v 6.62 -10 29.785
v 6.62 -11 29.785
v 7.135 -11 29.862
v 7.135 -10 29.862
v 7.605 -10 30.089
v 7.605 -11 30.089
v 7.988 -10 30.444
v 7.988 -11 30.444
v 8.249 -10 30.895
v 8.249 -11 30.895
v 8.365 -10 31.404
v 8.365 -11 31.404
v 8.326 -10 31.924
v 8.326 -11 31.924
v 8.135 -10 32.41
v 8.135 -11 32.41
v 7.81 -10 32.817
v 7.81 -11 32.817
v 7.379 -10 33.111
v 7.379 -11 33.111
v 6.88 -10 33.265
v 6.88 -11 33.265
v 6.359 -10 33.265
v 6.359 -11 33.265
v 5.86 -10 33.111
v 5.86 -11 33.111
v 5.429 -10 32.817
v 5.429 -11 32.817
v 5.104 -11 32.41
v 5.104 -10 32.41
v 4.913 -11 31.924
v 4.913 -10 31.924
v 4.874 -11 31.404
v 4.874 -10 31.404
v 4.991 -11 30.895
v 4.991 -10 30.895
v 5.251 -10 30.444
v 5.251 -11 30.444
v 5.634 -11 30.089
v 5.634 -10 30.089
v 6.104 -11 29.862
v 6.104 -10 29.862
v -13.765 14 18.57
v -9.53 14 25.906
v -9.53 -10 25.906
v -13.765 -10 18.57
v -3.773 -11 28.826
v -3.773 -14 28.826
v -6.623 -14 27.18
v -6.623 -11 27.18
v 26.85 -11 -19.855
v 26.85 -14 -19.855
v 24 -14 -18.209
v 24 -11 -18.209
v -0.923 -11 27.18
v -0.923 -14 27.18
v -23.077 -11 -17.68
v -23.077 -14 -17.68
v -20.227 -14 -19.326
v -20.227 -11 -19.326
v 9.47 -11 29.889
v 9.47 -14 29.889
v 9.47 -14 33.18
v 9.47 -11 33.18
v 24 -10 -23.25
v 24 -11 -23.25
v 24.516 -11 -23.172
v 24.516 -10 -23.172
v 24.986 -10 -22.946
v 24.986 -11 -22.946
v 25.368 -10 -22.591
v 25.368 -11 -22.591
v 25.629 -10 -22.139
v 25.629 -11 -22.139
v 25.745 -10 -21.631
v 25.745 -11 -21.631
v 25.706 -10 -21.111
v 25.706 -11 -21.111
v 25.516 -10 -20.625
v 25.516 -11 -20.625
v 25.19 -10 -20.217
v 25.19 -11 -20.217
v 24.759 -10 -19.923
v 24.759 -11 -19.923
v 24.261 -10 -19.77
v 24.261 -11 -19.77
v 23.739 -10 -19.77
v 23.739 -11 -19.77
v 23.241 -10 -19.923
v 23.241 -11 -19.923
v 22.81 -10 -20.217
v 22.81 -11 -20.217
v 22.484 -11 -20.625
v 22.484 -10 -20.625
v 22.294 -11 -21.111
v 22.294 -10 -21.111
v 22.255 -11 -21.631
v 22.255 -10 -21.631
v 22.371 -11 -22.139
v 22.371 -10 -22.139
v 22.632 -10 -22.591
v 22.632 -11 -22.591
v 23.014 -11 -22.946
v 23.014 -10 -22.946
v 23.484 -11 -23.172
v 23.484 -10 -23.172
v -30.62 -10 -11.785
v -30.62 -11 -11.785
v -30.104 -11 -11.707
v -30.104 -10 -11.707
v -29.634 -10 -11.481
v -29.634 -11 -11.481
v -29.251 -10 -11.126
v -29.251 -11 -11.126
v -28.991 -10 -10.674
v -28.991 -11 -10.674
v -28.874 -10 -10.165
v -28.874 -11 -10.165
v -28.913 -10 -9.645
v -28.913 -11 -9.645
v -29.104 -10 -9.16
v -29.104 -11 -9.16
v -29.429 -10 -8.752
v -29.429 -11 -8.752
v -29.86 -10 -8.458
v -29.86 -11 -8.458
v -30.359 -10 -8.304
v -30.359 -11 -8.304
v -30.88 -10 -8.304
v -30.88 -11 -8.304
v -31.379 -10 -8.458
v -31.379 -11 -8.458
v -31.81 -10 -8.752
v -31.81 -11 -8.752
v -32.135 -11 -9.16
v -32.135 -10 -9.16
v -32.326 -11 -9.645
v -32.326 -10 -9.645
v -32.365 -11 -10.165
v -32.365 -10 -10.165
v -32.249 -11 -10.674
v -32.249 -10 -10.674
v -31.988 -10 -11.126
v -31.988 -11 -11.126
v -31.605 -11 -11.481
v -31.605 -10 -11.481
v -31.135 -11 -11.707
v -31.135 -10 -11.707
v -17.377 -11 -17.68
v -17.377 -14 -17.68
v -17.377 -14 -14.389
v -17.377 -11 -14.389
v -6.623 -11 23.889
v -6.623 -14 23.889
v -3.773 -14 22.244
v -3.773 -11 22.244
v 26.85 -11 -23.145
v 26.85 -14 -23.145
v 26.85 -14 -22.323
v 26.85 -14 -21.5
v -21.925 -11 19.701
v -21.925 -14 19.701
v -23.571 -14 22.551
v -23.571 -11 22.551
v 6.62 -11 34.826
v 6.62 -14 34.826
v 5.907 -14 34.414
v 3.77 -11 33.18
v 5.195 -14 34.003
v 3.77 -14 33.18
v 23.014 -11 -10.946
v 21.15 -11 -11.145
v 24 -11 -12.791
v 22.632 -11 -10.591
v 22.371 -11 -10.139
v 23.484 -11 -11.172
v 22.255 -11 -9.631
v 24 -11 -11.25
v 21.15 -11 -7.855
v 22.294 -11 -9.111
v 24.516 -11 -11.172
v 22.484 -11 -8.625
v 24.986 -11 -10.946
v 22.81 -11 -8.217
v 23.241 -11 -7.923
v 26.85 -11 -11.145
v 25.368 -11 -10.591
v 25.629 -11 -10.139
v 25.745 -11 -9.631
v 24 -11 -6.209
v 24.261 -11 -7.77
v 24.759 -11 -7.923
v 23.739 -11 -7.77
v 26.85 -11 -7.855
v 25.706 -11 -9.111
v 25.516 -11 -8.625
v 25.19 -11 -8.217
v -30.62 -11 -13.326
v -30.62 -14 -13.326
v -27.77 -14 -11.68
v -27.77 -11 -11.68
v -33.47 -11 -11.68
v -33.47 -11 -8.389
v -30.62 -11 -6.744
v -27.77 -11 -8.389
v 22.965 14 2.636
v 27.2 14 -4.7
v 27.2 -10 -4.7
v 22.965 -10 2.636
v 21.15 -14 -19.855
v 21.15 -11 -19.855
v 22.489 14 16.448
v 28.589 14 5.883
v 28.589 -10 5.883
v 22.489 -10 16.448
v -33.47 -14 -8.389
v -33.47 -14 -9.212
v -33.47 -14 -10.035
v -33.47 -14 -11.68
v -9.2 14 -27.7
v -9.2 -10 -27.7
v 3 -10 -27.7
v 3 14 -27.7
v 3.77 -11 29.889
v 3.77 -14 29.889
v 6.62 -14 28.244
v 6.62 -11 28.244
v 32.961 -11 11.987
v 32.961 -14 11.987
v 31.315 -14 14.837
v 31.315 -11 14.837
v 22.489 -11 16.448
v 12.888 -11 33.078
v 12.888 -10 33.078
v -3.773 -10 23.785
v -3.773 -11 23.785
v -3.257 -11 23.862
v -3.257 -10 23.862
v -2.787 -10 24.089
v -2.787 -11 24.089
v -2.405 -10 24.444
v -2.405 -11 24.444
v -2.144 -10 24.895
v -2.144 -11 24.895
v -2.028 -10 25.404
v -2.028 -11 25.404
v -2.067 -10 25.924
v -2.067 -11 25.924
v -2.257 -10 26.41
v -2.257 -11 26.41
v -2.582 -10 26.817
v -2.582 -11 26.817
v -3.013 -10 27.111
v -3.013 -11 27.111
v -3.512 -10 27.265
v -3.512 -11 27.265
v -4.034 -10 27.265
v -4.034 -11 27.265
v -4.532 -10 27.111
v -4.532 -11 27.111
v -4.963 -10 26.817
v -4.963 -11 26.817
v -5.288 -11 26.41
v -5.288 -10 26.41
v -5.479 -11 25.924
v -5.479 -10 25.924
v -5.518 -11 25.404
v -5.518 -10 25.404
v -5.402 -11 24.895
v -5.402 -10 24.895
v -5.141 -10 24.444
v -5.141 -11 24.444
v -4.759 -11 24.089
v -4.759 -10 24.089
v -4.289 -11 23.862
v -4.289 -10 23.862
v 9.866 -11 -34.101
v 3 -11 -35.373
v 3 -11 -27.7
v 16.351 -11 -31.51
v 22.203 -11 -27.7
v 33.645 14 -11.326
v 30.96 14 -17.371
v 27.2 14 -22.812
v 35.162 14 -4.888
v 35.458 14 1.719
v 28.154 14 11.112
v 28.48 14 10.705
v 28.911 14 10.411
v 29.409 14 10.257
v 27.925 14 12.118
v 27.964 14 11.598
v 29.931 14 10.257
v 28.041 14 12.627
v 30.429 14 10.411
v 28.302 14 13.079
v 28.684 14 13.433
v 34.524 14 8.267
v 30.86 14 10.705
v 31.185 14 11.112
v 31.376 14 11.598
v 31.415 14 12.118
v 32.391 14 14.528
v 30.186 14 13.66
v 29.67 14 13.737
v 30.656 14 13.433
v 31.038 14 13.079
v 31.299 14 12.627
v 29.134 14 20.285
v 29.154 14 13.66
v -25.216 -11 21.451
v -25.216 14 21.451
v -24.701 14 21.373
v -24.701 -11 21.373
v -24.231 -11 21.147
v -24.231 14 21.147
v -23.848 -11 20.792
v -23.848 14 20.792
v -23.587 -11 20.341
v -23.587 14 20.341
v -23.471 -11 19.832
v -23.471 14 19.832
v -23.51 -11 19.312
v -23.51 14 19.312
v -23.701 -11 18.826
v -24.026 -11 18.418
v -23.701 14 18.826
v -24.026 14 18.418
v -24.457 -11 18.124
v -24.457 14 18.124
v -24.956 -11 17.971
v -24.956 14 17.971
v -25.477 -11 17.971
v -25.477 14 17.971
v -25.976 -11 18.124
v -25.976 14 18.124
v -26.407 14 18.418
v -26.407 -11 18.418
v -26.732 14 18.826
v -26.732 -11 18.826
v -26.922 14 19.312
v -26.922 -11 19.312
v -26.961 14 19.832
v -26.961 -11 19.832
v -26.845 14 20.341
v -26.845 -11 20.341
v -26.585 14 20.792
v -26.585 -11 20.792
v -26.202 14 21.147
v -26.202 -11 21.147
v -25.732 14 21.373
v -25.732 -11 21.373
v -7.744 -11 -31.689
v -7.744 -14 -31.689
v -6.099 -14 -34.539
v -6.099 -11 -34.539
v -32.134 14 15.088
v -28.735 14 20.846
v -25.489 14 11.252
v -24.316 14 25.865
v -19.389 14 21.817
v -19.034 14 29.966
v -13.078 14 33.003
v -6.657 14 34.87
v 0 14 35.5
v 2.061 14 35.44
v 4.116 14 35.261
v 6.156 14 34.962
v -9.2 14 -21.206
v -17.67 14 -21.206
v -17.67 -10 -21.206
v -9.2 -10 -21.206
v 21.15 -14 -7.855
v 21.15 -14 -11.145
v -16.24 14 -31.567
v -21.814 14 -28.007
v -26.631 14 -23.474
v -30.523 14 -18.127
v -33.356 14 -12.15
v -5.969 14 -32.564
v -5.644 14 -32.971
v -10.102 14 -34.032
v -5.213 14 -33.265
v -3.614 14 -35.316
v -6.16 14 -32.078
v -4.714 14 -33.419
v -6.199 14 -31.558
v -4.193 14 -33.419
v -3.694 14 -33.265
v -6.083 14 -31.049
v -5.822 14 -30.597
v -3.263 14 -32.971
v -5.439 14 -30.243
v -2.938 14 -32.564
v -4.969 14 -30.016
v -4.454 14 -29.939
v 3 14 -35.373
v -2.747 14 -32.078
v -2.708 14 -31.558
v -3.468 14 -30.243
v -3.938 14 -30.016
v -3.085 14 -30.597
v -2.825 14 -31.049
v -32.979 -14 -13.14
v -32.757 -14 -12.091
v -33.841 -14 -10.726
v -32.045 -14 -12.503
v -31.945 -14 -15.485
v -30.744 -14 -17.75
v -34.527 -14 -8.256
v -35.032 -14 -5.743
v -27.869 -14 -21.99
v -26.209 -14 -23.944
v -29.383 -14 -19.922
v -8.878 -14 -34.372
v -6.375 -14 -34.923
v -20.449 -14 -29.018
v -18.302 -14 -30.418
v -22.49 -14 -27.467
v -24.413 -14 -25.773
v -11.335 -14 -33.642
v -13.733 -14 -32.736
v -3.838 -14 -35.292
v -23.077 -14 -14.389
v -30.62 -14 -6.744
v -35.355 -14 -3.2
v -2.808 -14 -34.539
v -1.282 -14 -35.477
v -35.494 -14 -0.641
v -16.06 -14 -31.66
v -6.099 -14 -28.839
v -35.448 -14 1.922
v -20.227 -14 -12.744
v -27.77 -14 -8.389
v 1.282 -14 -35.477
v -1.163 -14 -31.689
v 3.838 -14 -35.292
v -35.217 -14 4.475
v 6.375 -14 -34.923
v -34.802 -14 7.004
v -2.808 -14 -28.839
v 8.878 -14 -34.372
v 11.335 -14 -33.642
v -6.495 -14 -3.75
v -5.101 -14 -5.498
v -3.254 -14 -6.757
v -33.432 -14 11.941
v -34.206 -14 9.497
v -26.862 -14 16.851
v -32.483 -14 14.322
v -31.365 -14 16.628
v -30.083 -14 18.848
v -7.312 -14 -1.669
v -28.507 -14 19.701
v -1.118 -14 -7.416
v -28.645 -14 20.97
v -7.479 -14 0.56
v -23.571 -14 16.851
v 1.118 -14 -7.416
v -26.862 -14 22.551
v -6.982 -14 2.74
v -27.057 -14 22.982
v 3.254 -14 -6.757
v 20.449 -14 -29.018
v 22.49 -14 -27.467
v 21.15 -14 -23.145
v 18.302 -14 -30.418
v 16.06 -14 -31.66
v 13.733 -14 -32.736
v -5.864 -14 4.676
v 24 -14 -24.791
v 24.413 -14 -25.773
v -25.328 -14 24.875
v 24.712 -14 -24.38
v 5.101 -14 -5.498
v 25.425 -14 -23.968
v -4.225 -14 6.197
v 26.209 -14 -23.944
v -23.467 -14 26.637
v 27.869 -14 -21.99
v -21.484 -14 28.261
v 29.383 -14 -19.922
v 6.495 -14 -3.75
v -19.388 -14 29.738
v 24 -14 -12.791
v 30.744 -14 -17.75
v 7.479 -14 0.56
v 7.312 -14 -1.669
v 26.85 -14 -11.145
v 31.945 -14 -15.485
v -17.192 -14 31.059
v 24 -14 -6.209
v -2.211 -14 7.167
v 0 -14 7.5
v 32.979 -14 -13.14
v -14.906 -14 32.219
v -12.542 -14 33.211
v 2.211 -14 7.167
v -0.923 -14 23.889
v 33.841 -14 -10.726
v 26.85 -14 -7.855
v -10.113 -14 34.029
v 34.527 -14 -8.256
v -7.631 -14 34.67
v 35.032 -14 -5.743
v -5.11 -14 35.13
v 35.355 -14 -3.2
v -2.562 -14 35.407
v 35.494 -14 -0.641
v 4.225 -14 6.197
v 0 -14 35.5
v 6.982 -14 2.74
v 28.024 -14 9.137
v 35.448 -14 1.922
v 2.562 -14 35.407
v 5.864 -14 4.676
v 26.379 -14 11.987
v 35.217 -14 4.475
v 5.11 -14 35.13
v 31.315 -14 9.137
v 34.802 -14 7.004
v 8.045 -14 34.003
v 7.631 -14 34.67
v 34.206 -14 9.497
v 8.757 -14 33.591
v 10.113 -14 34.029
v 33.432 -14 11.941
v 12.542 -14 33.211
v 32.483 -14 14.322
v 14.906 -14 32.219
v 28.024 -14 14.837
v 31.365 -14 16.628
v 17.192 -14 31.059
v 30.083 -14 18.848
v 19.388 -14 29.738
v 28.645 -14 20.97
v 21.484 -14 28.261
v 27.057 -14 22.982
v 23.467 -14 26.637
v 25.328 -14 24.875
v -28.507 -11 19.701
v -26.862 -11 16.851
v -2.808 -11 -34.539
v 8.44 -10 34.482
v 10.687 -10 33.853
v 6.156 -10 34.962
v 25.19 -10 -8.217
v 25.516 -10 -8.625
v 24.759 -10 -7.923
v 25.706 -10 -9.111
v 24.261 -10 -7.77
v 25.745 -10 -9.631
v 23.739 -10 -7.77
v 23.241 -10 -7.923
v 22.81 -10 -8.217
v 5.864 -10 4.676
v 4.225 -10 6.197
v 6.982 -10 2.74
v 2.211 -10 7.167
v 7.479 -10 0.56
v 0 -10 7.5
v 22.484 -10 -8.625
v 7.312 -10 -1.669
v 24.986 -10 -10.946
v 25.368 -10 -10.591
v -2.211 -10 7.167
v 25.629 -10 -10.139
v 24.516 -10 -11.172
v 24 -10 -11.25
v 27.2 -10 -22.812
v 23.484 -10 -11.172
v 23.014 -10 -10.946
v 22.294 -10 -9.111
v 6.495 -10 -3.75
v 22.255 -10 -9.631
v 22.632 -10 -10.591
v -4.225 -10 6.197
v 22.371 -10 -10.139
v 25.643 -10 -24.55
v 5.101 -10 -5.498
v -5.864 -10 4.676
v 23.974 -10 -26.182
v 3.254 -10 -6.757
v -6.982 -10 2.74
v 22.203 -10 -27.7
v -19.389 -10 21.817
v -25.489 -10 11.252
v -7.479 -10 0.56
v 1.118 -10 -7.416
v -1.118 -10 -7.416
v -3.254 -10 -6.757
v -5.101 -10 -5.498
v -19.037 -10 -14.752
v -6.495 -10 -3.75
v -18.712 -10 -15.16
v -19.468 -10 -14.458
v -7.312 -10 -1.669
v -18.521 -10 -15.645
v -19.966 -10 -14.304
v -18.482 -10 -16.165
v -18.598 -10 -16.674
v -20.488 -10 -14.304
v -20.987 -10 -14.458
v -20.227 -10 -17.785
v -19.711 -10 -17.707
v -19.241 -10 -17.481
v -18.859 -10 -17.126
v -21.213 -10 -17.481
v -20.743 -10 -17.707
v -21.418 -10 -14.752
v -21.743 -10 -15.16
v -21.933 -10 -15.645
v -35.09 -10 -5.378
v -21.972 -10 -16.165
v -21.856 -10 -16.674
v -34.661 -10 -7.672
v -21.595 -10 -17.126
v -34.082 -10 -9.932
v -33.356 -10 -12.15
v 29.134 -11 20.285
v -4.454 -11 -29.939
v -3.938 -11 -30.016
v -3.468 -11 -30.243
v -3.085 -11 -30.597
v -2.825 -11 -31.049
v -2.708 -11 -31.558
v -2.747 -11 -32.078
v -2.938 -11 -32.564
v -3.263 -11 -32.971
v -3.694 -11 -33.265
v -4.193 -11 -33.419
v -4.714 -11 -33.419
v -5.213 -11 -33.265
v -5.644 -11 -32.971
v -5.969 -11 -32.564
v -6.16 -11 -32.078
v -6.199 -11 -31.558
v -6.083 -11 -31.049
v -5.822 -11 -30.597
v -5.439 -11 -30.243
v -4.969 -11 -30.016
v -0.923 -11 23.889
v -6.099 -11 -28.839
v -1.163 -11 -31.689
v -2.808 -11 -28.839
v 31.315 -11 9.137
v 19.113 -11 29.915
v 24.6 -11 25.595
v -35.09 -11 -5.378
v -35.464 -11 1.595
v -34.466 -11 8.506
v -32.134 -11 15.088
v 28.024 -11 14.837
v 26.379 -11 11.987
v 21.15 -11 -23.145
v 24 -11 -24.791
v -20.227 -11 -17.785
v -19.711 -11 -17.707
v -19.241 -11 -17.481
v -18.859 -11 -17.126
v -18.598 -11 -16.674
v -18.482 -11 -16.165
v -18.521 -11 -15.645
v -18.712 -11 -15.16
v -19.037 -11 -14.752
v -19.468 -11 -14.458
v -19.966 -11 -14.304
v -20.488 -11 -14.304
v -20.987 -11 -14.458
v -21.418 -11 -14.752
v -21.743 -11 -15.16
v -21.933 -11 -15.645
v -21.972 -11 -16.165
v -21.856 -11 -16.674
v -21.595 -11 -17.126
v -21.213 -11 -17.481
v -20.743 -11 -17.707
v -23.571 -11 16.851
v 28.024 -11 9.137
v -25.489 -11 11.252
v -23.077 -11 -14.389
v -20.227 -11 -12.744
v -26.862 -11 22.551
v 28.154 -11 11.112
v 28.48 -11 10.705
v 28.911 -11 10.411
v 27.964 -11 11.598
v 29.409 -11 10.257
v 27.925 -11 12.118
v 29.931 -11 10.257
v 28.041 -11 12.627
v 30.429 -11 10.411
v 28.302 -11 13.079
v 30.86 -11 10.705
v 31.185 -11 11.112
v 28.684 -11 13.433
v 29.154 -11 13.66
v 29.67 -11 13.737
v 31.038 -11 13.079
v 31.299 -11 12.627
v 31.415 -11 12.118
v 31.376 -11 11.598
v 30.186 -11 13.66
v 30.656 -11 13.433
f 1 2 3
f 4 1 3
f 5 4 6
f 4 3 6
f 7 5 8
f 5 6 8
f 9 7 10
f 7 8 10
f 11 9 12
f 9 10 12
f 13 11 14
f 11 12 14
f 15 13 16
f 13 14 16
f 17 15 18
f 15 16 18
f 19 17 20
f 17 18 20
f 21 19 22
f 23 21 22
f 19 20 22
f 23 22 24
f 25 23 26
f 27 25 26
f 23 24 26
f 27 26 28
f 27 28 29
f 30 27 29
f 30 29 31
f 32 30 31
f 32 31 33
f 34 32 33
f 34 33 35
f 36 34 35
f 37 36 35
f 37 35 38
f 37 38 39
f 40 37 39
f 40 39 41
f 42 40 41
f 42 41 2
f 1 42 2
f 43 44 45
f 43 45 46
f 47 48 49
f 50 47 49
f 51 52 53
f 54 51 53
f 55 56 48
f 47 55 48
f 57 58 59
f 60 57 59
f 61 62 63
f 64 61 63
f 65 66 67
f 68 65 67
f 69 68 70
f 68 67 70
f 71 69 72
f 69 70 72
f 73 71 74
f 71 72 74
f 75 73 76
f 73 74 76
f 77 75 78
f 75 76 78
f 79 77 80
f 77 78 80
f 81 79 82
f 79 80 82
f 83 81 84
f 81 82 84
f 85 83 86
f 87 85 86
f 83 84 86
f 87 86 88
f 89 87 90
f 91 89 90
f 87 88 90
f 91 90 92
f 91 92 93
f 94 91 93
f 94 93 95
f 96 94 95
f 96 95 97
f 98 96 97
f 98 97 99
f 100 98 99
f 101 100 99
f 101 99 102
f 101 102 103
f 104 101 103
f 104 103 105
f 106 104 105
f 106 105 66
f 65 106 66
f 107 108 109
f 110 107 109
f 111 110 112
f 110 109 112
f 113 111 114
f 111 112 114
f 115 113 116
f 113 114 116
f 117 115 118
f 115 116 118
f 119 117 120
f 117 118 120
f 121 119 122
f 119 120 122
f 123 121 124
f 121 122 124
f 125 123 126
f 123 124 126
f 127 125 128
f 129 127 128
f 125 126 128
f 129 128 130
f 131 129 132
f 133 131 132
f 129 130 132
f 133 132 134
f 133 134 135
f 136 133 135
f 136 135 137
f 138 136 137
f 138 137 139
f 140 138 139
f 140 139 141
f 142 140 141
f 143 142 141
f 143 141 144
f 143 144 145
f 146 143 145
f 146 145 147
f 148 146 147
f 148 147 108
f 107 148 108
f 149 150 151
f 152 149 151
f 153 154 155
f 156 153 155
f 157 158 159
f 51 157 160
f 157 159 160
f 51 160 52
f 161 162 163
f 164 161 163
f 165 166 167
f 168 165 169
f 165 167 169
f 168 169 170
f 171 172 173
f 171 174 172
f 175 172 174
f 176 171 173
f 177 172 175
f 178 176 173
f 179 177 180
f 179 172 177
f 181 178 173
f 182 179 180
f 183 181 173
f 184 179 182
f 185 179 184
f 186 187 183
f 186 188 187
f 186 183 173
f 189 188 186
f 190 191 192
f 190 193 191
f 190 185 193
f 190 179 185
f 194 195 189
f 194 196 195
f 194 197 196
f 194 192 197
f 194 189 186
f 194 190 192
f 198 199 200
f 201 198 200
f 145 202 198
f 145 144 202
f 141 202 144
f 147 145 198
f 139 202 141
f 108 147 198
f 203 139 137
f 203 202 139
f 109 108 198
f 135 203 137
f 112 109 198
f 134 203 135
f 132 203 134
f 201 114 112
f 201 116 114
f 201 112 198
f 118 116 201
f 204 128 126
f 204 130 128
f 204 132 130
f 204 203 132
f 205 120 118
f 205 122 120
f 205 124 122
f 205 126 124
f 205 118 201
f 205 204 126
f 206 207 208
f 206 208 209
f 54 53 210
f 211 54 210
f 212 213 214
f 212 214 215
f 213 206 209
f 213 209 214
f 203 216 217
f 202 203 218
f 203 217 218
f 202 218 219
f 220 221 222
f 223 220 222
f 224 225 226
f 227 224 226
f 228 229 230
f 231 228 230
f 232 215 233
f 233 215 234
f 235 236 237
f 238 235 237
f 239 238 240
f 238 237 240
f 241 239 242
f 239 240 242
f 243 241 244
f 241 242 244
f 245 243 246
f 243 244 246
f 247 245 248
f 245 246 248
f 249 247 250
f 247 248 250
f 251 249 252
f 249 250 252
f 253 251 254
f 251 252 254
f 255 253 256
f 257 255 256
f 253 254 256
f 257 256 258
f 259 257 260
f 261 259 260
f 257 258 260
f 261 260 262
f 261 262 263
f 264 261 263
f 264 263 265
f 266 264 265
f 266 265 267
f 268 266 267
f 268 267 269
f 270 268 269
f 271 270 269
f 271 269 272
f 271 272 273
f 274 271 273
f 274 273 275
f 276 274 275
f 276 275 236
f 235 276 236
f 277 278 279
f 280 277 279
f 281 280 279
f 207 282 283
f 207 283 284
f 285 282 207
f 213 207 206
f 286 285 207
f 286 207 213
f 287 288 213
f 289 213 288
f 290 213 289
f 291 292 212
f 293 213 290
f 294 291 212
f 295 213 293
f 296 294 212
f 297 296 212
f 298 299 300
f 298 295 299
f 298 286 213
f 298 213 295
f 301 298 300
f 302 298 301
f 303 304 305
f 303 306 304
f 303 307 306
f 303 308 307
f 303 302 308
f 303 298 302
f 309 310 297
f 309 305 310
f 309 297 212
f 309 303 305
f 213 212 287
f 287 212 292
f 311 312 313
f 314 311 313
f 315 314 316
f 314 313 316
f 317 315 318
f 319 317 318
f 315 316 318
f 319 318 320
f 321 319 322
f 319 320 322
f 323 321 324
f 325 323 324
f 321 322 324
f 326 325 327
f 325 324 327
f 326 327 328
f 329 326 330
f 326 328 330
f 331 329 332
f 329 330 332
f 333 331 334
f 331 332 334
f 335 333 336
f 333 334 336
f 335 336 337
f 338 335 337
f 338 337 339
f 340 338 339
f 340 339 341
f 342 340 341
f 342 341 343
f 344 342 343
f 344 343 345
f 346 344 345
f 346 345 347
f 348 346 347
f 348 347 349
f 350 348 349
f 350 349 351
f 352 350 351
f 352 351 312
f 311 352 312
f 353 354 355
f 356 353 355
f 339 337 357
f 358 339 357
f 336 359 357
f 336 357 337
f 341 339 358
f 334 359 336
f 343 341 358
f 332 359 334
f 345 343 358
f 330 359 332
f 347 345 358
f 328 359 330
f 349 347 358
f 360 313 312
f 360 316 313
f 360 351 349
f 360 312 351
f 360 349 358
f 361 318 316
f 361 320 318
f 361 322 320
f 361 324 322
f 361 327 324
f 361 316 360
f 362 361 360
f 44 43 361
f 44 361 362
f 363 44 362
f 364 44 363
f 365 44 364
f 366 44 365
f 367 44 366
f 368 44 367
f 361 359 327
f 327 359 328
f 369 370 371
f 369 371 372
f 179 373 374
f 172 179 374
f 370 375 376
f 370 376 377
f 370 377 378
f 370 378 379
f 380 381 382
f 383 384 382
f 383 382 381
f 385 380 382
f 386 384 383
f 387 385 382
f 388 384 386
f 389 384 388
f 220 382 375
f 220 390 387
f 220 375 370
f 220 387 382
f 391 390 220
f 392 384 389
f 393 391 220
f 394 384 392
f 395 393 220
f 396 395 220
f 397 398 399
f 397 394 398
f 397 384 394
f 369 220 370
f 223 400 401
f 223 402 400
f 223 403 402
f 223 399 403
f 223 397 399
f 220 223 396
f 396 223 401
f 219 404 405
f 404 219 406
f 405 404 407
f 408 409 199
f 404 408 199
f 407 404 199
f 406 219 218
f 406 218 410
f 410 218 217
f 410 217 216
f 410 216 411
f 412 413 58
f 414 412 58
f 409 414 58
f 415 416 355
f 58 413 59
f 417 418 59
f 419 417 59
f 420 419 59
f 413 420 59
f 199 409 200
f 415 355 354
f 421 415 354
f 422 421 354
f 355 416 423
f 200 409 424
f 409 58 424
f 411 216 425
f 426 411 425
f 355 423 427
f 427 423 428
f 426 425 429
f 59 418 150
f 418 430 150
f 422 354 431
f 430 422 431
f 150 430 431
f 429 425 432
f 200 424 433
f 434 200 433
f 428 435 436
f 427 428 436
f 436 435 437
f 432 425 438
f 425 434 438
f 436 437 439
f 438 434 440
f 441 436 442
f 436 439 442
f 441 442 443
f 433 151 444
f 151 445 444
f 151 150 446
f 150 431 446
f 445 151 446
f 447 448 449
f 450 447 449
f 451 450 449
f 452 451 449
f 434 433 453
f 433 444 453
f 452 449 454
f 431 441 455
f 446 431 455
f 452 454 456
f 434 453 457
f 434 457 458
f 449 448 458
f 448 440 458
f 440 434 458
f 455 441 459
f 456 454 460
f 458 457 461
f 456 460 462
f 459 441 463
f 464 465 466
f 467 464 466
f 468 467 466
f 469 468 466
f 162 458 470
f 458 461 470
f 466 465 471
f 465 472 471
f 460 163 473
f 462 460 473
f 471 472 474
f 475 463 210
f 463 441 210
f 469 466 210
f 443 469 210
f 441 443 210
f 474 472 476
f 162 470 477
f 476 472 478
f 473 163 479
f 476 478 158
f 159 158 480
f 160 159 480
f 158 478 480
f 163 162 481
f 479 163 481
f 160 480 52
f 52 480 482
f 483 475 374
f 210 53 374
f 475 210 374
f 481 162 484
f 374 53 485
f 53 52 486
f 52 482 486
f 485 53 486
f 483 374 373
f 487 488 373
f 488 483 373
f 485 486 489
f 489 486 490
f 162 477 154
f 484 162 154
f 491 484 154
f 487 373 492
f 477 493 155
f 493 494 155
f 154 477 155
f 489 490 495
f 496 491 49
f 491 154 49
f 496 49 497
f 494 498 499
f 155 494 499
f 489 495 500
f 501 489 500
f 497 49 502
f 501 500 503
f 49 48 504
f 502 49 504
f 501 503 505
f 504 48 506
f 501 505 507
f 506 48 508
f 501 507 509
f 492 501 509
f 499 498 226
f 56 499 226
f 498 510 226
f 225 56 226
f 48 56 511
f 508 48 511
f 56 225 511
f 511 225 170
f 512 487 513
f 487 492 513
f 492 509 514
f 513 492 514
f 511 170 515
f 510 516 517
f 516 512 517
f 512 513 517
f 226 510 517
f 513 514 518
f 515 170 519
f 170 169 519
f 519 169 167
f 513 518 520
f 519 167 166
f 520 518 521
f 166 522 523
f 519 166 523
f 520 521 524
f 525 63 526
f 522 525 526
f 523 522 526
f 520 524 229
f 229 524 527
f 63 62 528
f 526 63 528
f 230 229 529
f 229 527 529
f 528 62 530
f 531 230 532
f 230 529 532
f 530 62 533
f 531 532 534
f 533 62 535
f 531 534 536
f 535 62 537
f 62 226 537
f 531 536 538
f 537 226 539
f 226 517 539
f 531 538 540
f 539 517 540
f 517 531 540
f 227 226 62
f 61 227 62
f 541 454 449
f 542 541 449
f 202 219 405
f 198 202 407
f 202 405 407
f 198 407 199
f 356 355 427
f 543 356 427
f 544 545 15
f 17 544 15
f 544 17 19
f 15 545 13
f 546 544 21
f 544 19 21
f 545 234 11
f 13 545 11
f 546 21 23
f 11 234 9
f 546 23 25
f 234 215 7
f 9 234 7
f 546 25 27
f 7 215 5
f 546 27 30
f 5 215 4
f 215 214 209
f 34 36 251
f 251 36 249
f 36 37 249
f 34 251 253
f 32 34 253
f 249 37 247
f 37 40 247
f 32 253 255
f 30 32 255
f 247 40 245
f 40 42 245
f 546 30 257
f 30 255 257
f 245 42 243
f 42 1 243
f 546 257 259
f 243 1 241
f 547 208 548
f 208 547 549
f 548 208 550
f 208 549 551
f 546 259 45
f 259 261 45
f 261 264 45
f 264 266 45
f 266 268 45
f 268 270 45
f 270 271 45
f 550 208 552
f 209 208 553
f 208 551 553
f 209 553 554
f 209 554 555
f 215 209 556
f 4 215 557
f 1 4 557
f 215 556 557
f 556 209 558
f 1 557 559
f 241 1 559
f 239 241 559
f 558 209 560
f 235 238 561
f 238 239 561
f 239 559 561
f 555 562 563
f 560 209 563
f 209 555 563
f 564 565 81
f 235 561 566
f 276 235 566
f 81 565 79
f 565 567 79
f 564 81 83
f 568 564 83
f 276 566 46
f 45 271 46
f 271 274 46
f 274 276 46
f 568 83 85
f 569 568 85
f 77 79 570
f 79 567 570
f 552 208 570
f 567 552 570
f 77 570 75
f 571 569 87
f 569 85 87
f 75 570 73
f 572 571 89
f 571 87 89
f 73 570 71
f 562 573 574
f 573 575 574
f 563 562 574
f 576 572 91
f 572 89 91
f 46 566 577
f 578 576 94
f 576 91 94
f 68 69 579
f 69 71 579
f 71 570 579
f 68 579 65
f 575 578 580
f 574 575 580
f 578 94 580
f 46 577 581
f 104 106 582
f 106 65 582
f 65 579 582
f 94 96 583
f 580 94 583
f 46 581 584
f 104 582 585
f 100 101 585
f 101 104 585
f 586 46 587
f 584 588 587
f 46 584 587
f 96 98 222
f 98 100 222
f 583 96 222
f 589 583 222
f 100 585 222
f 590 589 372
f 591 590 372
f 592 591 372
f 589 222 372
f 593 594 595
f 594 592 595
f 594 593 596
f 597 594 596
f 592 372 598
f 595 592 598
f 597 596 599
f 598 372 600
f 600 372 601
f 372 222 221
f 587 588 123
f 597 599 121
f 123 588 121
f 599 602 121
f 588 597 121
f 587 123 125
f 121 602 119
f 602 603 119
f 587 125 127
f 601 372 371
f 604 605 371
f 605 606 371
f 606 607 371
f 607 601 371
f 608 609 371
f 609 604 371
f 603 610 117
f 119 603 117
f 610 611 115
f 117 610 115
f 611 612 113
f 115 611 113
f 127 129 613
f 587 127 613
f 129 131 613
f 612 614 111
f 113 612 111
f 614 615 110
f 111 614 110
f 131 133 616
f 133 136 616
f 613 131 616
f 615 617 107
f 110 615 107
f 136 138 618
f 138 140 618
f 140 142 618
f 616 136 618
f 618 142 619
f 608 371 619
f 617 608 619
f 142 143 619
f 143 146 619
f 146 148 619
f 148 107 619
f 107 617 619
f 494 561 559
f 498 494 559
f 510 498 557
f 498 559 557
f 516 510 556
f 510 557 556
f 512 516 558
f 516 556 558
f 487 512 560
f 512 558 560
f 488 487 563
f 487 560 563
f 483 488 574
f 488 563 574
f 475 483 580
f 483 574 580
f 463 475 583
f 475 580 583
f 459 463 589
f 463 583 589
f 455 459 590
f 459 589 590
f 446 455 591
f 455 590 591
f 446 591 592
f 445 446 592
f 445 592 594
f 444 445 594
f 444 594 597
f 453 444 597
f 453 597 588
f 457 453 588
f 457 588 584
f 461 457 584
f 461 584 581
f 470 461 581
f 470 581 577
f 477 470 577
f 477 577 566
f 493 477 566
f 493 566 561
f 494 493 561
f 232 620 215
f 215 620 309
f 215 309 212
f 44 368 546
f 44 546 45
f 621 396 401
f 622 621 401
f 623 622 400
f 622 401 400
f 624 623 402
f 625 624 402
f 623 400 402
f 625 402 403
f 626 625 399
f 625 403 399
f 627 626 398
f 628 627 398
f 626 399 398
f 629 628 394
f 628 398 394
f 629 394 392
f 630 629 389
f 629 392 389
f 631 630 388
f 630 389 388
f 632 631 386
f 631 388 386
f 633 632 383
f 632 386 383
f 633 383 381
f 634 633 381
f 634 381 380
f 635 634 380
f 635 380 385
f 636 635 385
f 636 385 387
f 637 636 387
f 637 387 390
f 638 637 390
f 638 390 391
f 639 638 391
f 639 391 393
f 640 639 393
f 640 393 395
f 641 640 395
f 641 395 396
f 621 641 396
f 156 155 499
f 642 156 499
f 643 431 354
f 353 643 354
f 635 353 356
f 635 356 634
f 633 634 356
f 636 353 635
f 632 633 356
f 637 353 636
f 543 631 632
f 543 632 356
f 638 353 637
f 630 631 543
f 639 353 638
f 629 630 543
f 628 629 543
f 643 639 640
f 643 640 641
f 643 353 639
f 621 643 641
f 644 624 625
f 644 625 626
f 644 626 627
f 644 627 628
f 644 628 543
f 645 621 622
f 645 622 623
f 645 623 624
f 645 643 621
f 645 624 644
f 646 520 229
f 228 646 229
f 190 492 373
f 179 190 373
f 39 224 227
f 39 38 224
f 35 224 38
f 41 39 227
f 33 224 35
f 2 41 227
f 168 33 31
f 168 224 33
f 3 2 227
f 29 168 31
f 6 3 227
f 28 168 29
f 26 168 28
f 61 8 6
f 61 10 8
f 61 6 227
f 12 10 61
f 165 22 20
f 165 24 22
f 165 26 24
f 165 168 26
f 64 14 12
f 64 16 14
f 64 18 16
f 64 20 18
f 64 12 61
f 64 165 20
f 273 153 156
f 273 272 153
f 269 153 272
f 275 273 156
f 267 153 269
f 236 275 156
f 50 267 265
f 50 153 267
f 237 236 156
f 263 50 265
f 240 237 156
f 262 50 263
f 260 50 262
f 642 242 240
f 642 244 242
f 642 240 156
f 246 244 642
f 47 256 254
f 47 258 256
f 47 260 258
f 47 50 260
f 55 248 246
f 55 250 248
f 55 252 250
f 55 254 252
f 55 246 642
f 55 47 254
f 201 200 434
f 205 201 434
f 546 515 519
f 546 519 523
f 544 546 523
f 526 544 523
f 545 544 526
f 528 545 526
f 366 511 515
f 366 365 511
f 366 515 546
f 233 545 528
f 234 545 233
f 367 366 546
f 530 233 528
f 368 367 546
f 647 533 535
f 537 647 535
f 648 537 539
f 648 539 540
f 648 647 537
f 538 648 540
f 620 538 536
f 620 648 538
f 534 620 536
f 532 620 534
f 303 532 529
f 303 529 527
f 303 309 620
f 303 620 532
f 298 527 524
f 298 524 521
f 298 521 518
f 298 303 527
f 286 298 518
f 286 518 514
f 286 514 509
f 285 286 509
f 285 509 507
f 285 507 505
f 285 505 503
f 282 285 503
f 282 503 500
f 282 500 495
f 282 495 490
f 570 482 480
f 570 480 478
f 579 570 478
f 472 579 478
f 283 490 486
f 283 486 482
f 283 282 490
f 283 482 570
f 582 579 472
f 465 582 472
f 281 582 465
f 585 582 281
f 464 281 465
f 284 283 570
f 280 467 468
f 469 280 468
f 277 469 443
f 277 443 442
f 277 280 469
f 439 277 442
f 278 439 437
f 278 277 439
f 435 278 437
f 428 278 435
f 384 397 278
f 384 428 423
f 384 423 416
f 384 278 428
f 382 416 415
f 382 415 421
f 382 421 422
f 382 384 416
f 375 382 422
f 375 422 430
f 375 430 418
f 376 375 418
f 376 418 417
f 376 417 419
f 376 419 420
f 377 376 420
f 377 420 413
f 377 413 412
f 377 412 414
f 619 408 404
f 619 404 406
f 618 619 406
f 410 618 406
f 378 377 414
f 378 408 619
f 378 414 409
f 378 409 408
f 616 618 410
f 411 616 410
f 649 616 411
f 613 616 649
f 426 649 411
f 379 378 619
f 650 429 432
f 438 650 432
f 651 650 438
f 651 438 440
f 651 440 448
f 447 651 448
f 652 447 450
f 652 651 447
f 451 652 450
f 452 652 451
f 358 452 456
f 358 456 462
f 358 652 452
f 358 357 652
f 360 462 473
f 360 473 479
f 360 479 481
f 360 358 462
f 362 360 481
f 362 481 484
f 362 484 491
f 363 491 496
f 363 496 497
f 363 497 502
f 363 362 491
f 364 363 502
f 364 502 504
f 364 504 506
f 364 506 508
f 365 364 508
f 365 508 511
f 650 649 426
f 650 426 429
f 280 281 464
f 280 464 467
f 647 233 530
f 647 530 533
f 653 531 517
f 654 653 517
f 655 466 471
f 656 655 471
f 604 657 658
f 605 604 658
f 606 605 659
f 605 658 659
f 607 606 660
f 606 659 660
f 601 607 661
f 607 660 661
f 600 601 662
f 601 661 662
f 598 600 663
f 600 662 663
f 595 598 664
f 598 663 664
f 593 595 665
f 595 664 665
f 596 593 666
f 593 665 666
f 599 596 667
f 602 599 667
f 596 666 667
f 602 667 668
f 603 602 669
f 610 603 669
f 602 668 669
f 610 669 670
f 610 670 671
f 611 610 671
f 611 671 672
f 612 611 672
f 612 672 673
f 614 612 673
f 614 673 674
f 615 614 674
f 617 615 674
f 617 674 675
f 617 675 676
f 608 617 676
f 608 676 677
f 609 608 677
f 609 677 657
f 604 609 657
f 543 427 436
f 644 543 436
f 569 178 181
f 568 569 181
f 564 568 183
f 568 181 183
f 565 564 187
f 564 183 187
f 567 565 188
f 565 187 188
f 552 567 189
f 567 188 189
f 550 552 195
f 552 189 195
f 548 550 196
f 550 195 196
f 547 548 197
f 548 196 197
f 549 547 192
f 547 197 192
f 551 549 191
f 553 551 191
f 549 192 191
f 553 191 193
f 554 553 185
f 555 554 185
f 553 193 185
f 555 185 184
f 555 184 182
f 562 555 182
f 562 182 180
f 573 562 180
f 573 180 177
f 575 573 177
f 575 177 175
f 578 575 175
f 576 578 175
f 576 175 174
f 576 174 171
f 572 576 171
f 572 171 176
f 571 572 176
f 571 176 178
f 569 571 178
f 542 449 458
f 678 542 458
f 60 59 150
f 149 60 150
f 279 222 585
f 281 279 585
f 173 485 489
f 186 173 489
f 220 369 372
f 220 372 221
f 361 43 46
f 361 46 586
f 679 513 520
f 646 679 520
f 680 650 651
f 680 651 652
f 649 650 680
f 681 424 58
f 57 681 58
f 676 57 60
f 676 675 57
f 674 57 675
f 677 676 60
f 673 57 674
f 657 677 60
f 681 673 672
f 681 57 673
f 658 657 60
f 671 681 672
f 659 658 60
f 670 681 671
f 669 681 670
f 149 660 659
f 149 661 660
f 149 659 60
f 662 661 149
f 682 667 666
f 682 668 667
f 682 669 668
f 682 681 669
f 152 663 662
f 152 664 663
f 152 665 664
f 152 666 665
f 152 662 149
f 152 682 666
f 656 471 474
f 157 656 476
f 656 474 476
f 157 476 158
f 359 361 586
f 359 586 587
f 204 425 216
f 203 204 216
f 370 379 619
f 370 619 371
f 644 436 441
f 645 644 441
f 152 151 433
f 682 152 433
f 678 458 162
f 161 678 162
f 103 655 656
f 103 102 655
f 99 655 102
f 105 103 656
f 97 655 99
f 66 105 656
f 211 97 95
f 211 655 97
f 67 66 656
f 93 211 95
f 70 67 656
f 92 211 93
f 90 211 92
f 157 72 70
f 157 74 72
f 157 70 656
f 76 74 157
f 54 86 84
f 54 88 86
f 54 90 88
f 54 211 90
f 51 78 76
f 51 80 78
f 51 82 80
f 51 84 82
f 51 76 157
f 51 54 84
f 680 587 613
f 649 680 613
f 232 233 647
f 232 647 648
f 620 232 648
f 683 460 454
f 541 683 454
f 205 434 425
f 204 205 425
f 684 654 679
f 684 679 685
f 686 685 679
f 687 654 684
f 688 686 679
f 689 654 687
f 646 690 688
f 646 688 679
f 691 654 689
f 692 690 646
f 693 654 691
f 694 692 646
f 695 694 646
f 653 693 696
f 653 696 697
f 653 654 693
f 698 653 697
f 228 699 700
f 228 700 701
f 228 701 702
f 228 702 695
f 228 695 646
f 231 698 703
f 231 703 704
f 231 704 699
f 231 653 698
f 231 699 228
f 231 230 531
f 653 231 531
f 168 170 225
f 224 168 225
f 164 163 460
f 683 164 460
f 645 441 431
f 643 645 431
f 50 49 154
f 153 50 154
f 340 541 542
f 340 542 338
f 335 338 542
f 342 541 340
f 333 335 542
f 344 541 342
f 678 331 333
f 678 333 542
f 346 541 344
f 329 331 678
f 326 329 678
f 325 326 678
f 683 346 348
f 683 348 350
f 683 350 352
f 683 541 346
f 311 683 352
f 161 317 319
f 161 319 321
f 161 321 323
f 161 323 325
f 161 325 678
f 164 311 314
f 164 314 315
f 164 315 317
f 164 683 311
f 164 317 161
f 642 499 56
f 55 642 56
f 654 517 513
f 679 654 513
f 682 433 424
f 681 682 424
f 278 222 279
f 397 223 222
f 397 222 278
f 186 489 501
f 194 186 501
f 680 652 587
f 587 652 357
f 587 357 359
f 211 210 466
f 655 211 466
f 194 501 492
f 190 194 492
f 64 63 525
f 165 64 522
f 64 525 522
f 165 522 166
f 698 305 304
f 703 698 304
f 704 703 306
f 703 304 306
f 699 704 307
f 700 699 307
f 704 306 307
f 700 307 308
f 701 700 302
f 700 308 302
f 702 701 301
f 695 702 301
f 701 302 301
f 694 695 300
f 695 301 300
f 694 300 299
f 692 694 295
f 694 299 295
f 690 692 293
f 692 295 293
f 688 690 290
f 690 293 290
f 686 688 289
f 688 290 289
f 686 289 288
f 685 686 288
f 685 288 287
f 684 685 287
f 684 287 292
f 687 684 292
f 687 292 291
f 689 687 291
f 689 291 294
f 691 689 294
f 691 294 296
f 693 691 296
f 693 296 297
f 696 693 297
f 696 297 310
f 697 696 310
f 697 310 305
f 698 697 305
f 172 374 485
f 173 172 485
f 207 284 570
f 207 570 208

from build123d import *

# Parameters (mm, degrees)
SKETCH1_R           = 35.5
BOSS_EXTRUDE1_DEPTH = 14
CUT_EXTRUDE1_DEPTH  = 24
SKETCH3_W           = 20
SKETCH3_H           = 10
CUT_EXTRUDE2_DEPTH  = 25
SKETCH4_R           = 1.75
CUT_EXTRUDE3_DEPTH  = 58.484780595
CUT_EXTRUDE4_DEPTH  = 3
SKETCH6_R           = 1.75
CUT_EXTRUDE5_DEPTH  = 58.484780595
CUT_EXTRUDE6_DEPTH  = 3
SKETCH8_R           = 7.5
CUT_EXTRUDE7_DEPTH  = 56.646203824


with BuildPart() as part:
    # Sketch1 → Boss-Extrude1 (new, symmetric)
    with BuildSketch(Plane(origin=(0, 0, 0), x_dir=(1, 0, 0), z_dir=(0, 1, 0))):
        with Locations(Location((0, 0, 0), (0, 0, 270))):
            Circle(SKETCH1_R)
    extrude(amount=BOSS_EXTRUDE1_DEPTH, both=True)

    # Sketch2 → Cut-Extrude1 (cut)
    with BuildSketch(Plane(origin=(0, 14, 0), x_dir=(1, 0, 0), z_dir=(0, 1, 0))):
        Polygon((27.2, 27.7), (27.2, 4.7), (22.964840301, -2.635511777), (28.588903685, -5.882566285), (10.388903685, -37.405890983), (-9.529680602, -25.905890983), (-13.764840301, -18.570379206), (-19.388903685, -21.817433715), (-37.588903685, 9.705890983), (-17.670319398, 21.205890983), (-9.2, 21.205890983), (-9.2, 27.7), align=None)
    extrude(amount=-CUT_EXTRUDE1_DEPTH, mode=Mode.SUBTRACT)

    # Sketch3 → Cut-Extrude2 (cut)
    with BuildSketch(Plane(origin=(0, 14, 0), x_dir=(1, 0, 0), z_dir=(0, 1, 0))):
        Polygon((-35.488903685, 6.068584287), (-44.149157723, 1.068584287), (-34.149157723, -16.251923789), (-25.488903685, -11.251923789), align=None)
        with Locations((13, 32.7)):
            Rectangle(SKETCH3_W, SKETCH3_H)
        Polygon((12.488903685, -33.768584287), (21.149157723, -38.768584287), (31.149157723, -21.448076211), (22.488903685, -16.448076211), align=None)
    extrude(amount=-CUT_EXTRUDE2_DEPTH, mode=Mode.SUBTRACT)

    # Sketch4 → Cut-Extrude3 (cut, through all)
    with BuildSketch(Plane(origin=(0, 14, 0), x_dir=(1, 0, 0), z_dir=(0, 1, 0))):
        with Locations(Location((-4.453539231, 31.6885782, 0), (0, 0, 270))):
            Circle(SKETCH4_R)
        with Locations(Location((29.669883346, -11.987410989, 0), (0, 0, 270))):
            Circle(SKETCH4_R)
        with Locations(Location((-25.216344115, -19.70116721, 0), (0, 0, 270))):
            Circle(SKETCH4_R)
    extrude(amount=-CUT_EXTRUDE3_DEPTH, mode=Mode.SUBTRACT)

    # Sketch5 → Cut-Extrude4 (cut)
    with BuildSketch(Plane.XZ.offset(14)):
        Polygon((-26.861792383, 22.55116721), (-28.50724065, 19.70116721), (-26.861792383, 16.85116721), (-23.570895848, 16.85116721), (-21.925447581, 19.70116721), (-23.570895848, 22.55116721), align=None)
        Polygon((32.960779881, 11.987410989), (31.315331613, 14.837410989), (28.024435079, 14.837410989), (26.378986812, 11.987410989), (28.024435079, 9.137410989), (31.315331613, 9.137410989), align=None)
        Polygon((-6.098987498, -34.5385782), (-2.808090964, -34.5385782), (-1.162642696, -31.6885782), (-2.808090964, -28.8385782), (-6.098987498, -28.8385782), (-7.744435765, -31.6885782), align=None)
    extrude(amount=-CUT_EXTRUDE4_DEPTH, mode=Mode.SUBTRACT)

    # Sketch6 → Cut-Extrude5 (cut, through all)
    with BuildSketch(Plane.XZ.offset(14)):
        with Locations(Location((6.619546181, 31.534609691, 0), (0, 0, 270))):
            Circle(SKETCH6_R)
        with Locations(Location((-3.772758664, 25.534609691, 0), (0, 0, 270))):
            Circle(SKETCH6_R)
        with Locations(Location((24, -21.5, 0), (0, 0, 270))):
            Circle(SKETCH6_R)
        with Locations(Location((24, -9.5, 0), (0, 0, 270))):
            Circle(SKETCH6_R)
        with Locations(Location((-30.619546181, -10.034609691, 0), (0, 0, 270))):
            Circle(SKETCH6_R)
        with Locations(Location((-20.227241336, -16.034609691, 0), (0, 0, 270))):
            Circle(SKETCH6_R)
    extrude(amount=-CUT_EXTRUDE5_DEPTH, mode=Mode.SUBTRACT)

    # Sketch7 → Cut-Extrude6 (cut)
    with BuildSketch(Plane.XZ.offset(14)):
        Polygon((9.469546181, 29.889161424), (9.469546181, 33.180057958), (6.619546181, 34.825506225), (3.769546181, 33.180057958), (3.769546181, 29.889161424), (6.619546181, 28.243713156), align=None)
        Polygon((-30.619546181, -6.743713156), (-33.469546181, -8.389161424), (-33.469546181, -11.680057958), (-30.619546181, -13.325506225), (-27.769546181, -11.680057958), (-27.769546181, -8.389161424), align=None)
        Polygon((-23.077241336, -14.389161424), (-23.077241336, -17.680057958), (-20.227241336, -19.325506225), (-17.377241336, -17.680057958), (-17.377241336, -14.389161424), (-20.227241336, -12.743713156), align=None)
        Polygon((-0.922758664, 27.180057958), (-3.772758664, 28.825506225), (-6.622758664, 27.180057958), (-6.622758664, 23.889161424), (-3.772758664, 22.243713156), (-0.922758664, 23.889161424), align=None)
        Polygon((21.15, -23.145448267), (24, -24.790896534), (26.85, -23.145448267), (26.85, -19.854551733), (24, -18.209103466), (21.15, -19.854551733), align=None)
        Polygon((24, -12.790896534), (26.85, -11.145448267), (26.85, -7.854551733), (24, -6.209103466), (21.15, -7.854551733), (21.15, -11.145448267), align=None)
    extrude(amount=-CUT_EXTRUDE6_DEPTH, mode=Mode.SUBTRACT)

    # Sketch8 → Cut-Extrude7 (cut, through all)
    with BuildSketch(Plane(origin=(0, -10, 0), x_dir=(1, 0, 0), z_dir=(0, 1, 0))):
        with Locations(Location((0, 0, 0), (0, 0, 270))):
            Circle(SKETCH8_R)
    extrude(amount=-CUT_EXTRUDE7_DEPTH, mode=Mode.SUBTRACT)


solid = part.part
